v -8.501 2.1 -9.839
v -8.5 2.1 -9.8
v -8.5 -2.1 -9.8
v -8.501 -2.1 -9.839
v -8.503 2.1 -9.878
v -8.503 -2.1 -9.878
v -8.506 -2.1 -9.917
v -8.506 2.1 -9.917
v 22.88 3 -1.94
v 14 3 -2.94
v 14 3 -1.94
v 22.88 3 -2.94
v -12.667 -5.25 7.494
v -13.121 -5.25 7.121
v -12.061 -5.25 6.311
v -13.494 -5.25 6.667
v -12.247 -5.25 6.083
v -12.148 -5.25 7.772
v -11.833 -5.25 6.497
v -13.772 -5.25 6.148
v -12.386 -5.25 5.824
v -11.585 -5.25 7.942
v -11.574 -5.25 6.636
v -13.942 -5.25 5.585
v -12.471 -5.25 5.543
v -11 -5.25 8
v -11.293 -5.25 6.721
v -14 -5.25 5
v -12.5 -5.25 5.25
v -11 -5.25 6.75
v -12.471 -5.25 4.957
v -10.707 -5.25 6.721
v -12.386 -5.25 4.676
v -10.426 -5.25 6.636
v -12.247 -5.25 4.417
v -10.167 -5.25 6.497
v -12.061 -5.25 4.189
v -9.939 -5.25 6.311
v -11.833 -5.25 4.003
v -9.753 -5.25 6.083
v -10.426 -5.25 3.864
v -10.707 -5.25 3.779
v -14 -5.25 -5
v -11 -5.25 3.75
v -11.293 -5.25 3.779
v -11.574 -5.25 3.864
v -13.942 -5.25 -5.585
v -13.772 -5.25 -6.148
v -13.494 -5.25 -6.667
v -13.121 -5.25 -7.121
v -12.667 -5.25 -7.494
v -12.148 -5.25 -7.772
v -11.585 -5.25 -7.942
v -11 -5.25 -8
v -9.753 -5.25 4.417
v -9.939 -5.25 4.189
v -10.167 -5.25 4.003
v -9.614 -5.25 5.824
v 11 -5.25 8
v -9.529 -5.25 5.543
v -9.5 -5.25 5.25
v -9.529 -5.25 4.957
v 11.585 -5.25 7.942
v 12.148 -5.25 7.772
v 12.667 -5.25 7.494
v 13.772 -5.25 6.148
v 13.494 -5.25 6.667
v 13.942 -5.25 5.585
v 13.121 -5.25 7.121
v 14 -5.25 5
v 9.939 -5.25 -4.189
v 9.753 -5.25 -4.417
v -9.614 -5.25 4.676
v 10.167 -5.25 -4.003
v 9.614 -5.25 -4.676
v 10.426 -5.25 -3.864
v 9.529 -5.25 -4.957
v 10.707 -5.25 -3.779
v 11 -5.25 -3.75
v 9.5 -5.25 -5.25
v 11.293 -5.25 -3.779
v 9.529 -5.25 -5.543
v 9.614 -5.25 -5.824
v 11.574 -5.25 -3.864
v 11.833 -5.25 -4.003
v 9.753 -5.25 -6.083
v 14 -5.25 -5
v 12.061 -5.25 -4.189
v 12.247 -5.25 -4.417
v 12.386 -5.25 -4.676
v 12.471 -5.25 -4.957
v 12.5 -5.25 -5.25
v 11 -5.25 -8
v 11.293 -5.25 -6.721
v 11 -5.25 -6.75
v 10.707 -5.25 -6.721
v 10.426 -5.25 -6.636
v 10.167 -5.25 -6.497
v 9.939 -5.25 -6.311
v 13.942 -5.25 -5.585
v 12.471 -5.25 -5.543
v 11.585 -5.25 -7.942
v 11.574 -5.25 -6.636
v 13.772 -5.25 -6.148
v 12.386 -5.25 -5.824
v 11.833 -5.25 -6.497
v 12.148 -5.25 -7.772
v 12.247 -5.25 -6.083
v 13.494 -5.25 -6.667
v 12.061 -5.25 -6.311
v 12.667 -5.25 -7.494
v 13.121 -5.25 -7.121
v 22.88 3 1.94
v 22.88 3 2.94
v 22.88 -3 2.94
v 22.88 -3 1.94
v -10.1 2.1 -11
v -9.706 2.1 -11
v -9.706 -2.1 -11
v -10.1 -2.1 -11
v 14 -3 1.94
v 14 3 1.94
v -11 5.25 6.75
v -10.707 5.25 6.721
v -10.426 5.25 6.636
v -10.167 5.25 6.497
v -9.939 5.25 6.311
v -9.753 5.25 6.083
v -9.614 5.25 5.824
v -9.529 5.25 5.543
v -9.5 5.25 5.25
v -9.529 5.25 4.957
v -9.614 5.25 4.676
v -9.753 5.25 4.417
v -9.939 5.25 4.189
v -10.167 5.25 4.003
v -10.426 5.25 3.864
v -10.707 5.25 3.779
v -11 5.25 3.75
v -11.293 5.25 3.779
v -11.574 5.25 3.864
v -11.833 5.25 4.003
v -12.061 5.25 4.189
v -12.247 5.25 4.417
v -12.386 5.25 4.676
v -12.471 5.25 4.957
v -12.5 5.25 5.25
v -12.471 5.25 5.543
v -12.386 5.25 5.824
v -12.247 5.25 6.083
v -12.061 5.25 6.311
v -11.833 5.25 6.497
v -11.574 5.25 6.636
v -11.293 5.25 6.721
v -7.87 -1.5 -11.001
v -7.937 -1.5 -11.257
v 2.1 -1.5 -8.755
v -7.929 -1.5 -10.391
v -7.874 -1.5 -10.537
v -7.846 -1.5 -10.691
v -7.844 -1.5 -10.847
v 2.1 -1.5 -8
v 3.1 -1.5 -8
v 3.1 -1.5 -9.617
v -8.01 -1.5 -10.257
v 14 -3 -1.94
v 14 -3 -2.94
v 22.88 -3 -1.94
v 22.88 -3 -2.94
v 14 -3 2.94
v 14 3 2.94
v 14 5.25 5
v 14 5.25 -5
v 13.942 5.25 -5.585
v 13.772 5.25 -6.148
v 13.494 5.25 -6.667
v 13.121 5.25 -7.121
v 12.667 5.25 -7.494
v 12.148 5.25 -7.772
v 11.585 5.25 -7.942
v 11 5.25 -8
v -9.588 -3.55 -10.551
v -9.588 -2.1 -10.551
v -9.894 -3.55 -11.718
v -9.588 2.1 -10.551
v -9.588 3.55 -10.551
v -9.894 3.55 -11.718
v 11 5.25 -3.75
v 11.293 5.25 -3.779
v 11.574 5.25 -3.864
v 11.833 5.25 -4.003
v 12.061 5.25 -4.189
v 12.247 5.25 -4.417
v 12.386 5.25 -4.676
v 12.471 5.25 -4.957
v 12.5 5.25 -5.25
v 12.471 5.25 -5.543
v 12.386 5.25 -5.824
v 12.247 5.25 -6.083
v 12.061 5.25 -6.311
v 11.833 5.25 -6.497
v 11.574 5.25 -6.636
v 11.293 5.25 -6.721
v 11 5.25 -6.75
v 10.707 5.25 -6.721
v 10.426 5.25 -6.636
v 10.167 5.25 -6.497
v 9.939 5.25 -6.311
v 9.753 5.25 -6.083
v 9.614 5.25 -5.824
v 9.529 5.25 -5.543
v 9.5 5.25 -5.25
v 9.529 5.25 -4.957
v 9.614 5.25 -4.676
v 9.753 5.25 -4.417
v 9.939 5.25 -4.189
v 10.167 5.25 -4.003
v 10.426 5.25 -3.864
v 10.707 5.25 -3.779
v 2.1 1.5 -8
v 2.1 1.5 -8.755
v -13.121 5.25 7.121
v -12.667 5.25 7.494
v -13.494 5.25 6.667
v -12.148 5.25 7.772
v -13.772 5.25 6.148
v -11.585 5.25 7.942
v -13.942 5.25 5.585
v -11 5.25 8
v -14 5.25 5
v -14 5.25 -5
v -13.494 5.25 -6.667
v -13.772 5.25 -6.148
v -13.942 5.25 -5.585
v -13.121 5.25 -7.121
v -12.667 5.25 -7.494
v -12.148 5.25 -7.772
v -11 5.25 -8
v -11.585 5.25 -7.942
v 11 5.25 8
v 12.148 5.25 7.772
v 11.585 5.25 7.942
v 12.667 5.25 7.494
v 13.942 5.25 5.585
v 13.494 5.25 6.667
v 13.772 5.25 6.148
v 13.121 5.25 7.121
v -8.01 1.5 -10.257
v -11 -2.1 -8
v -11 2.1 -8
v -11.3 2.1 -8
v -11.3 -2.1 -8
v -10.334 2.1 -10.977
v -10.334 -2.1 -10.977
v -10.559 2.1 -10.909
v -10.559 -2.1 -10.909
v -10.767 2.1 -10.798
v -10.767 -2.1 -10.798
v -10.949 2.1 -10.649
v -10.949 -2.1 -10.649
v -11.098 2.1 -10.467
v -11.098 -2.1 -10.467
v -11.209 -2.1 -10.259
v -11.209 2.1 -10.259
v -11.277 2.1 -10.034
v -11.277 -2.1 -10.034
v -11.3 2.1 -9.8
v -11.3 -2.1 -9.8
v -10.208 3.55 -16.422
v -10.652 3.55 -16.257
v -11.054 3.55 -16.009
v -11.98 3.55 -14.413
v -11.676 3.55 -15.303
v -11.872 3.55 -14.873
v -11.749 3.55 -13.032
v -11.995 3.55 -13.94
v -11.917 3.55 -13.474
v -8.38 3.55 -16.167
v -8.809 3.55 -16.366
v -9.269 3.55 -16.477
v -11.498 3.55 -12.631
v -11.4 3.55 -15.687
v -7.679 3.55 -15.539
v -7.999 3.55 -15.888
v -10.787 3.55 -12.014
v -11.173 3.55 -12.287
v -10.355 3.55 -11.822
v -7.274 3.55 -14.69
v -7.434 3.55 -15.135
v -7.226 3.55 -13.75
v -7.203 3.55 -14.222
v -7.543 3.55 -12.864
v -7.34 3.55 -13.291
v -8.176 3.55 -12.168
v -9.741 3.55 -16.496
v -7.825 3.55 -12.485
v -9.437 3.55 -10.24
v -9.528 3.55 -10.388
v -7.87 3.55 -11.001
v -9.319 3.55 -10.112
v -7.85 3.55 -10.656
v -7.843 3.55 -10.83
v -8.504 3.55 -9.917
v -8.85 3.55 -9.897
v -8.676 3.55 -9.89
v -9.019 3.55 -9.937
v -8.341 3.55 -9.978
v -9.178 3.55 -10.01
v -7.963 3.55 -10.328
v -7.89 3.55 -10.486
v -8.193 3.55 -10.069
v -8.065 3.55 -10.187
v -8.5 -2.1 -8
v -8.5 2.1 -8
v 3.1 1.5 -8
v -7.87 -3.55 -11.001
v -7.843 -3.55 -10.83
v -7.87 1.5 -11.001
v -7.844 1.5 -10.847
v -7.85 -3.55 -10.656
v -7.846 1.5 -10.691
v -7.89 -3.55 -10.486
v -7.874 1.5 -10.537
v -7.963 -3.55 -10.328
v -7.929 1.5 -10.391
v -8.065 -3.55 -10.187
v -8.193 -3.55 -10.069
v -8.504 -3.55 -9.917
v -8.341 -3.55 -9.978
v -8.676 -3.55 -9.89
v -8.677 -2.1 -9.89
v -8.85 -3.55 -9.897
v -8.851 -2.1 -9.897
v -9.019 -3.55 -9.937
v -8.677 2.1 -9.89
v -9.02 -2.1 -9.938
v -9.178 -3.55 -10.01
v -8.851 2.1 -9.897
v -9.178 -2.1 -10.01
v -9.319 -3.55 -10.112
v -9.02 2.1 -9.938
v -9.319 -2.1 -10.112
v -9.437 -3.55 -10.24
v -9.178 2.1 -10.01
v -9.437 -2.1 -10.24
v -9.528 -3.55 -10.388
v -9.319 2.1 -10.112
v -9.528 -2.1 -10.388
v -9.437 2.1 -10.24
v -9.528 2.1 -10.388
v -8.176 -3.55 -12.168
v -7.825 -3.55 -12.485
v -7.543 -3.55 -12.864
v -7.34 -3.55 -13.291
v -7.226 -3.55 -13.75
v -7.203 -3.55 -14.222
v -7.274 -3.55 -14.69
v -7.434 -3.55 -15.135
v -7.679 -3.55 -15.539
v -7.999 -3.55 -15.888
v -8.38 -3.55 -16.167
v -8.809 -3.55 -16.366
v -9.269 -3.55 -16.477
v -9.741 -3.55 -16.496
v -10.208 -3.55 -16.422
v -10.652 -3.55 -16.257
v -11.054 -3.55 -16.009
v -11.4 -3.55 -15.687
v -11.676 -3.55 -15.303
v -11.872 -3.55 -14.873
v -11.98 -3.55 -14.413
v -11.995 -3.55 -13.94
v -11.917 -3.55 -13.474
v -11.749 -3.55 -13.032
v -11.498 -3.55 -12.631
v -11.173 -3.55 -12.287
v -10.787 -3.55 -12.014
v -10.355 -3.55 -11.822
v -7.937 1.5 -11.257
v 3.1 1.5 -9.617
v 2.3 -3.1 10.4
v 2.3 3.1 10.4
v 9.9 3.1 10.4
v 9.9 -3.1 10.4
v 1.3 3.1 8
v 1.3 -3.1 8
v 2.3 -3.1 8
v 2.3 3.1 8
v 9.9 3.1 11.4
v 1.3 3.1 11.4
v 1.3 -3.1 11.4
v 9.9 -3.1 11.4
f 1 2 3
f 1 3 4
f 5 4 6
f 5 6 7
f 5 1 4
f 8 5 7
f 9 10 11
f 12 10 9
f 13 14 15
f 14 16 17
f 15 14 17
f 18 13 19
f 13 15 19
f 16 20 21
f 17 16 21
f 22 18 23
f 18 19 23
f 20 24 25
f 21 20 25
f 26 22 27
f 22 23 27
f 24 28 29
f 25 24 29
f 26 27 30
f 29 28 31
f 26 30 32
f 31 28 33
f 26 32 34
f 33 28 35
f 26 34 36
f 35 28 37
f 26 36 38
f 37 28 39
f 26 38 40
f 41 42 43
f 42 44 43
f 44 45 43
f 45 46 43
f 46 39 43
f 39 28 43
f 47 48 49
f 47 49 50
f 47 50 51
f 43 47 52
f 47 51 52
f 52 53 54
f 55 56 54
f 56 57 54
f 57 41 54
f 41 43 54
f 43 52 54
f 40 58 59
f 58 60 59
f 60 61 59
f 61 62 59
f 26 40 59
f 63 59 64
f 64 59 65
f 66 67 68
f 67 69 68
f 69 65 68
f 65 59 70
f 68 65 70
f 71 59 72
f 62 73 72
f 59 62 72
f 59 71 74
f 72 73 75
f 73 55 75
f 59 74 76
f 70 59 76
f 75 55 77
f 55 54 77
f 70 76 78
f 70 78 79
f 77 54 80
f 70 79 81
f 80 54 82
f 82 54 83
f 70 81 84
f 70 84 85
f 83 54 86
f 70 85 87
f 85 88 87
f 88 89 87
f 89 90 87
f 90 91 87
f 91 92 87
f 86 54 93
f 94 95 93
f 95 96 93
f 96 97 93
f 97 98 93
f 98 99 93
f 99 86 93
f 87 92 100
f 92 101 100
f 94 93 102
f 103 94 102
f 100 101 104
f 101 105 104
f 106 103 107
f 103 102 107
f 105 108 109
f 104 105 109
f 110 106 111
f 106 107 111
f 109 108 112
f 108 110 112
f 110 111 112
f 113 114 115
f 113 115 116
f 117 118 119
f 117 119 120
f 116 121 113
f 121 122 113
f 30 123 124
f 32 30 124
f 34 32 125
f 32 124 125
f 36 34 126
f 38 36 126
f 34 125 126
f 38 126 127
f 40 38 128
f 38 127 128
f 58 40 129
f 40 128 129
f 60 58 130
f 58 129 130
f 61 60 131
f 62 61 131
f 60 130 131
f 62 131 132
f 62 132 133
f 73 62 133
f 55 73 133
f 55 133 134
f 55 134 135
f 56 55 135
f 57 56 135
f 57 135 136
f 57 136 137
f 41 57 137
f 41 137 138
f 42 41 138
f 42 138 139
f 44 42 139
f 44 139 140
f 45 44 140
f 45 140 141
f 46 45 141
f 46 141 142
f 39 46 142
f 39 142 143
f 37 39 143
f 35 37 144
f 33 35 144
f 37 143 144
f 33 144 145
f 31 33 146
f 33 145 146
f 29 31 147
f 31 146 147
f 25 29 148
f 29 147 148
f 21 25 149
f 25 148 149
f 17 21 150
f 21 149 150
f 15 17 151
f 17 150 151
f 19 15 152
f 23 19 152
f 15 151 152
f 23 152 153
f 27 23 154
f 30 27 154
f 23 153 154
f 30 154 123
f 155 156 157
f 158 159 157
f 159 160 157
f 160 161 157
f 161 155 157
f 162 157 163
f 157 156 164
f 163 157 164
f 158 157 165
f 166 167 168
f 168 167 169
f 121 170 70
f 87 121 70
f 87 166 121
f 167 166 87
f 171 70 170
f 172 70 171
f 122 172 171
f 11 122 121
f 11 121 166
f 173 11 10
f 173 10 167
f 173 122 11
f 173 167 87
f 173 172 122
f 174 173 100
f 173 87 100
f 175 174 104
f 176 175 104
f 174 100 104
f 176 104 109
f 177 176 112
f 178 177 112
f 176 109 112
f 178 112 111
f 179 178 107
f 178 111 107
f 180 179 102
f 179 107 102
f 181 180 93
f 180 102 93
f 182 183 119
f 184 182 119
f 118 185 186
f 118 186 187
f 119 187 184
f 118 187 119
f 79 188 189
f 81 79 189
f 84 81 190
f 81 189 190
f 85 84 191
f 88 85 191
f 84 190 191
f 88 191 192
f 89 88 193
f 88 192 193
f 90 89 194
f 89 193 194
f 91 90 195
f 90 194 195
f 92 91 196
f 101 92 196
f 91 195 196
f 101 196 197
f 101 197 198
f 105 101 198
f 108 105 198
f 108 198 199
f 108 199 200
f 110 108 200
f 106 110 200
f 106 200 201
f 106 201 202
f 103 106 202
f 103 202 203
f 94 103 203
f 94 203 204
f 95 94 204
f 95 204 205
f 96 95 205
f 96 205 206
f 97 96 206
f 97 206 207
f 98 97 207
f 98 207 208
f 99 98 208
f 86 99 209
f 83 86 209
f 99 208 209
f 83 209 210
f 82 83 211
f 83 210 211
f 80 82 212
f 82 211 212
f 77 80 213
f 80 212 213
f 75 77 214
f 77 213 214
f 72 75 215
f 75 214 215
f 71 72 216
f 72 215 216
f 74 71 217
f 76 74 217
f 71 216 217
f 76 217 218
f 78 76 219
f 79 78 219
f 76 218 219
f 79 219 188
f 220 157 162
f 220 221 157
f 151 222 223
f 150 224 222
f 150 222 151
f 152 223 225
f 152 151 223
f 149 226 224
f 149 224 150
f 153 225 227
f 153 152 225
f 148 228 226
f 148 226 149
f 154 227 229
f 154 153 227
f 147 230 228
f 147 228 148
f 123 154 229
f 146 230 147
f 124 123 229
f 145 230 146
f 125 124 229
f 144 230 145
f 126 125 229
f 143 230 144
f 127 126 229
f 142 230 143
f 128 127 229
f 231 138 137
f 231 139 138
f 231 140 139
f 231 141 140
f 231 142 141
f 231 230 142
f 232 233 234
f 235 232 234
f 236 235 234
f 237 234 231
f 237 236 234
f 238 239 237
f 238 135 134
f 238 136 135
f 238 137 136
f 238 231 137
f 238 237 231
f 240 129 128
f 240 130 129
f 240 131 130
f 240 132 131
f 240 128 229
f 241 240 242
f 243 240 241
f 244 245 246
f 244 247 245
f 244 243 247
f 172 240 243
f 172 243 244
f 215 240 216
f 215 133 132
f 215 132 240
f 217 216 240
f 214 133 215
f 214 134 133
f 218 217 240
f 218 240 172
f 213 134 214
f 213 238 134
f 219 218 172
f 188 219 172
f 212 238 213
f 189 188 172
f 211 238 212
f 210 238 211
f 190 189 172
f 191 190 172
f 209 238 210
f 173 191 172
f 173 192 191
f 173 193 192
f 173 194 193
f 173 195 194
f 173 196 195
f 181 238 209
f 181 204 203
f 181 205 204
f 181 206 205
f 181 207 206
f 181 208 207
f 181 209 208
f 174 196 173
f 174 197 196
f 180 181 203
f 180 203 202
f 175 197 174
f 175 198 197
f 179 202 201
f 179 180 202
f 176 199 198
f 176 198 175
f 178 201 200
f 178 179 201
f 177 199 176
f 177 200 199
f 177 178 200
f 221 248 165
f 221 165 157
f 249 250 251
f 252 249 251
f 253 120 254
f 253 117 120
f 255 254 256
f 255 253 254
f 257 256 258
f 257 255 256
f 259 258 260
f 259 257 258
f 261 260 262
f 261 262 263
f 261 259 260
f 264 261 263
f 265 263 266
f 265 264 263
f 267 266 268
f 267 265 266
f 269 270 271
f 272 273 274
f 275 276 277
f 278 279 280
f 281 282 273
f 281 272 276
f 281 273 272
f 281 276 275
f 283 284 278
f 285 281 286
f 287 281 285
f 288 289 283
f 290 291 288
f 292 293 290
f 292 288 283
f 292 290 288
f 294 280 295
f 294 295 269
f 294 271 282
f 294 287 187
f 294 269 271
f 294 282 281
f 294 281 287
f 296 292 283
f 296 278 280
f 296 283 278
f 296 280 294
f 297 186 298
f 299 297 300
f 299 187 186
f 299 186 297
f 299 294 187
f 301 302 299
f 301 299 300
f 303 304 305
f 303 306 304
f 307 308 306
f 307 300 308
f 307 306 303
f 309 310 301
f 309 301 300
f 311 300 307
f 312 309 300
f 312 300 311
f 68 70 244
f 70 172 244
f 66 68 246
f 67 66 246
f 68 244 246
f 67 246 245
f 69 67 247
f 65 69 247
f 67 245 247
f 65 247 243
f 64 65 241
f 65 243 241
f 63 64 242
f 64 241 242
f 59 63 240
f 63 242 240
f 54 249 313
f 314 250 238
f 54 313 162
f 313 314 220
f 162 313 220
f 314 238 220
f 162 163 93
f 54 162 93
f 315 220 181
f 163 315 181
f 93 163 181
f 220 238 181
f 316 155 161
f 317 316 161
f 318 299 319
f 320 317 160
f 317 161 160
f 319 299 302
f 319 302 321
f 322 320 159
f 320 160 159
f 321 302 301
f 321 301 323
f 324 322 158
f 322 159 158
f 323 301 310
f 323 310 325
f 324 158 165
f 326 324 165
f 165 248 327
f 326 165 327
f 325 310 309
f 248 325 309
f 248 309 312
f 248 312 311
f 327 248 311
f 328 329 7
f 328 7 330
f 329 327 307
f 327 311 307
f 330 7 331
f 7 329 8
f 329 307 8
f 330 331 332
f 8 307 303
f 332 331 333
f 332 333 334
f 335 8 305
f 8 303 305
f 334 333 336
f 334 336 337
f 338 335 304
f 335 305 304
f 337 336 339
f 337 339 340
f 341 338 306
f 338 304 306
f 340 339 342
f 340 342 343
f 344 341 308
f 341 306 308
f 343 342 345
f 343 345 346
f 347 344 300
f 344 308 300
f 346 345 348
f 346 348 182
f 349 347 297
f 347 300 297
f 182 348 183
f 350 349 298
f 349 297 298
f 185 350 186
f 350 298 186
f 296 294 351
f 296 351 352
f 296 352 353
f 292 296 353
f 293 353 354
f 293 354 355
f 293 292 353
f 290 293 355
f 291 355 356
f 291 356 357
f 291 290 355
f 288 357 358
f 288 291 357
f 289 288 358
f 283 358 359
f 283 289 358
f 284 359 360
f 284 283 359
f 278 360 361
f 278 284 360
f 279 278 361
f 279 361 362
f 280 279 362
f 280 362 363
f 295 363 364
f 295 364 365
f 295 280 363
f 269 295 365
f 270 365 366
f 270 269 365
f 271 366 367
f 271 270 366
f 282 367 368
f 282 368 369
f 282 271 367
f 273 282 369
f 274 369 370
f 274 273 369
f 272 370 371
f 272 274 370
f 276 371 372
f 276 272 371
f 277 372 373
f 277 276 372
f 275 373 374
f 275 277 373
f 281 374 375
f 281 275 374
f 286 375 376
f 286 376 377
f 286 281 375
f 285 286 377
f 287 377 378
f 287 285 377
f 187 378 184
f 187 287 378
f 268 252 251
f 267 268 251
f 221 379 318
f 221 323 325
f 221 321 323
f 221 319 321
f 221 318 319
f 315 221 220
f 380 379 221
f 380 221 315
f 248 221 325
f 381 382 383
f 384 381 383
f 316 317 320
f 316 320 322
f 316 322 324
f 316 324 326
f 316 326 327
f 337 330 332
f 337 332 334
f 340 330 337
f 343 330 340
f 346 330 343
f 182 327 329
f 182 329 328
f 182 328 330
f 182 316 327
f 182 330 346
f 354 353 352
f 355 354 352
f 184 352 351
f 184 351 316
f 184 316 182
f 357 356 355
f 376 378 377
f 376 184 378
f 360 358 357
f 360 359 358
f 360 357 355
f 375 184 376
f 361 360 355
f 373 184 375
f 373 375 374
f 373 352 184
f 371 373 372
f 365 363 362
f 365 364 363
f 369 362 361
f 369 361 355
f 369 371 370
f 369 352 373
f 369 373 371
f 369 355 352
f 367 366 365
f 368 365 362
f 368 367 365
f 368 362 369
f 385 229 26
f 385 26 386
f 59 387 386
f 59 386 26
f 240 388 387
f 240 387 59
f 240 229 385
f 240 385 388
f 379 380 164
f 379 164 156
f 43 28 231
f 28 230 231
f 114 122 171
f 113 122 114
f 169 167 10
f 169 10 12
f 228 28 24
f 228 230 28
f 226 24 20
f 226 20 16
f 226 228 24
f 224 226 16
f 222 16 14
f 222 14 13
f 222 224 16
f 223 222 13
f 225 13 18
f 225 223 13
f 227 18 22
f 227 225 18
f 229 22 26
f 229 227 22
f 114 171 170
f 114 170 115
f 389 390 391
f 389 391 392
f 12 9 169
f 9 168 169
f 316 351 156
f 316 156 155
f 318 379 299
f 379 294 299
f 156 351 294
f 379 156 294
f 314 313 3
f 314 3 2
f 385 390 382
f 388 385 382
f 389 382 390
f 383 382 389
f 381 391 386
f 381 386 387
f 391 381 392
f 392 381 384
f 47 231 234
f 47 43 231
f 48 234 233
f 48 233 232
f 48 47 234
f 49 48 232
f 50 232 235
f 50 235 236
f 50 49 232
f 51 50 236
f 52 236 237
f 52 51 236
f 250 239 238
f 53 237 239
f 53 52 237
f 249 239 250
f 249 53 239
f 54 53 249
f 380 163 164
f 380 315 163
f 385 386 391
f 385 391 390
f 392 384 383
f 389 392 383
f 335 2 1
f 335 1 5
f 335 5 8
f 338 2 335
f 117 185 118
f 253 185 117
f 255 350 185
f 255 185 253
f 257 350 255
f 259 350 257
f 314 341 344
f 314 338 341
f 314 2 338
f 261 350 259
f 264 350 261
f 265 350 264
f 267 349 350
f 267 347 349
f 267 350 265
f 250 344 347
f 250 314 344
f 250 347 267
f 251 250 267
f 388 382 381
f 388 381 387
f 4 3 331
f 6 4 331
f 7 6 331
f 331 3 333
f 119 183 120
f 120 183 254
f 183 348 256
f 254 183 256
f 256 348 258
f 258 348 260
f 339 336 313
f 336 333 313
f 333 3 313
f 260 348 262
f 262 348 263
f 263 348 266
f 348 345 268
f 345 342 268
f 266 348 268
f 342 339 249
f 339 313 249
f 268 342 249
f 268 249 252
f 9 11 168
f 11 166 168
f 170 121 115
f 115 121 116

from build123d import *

# Parameters (mm, degrees)
SKETCH_1_W          = 28
SKETCH_1_H          = 16
EXTRUDE_1_DEPTH     = 5.25
FILLET_1_R          = 3
CUT_EXTRUDE_1_REACH = 21.242
SKETCH_2_R          = 1.5
SKETCH_3_W          = 8.6
SKETCH_3_H          = 6.2
EXTRUDE_2_DEPTH     = 3.4
CUT_EXTRUDE_2_REACH = 21.892
SKETCH_4_W          = 7.6
SKETCH_4_H          = 2.4
SKETCH_5_W          = 8.88
SKETCH_5_H          = 1
EXTRUDE_3_DEPTH     = 3
SKETCH_6_W          = 2.8
SKETCH_6_H          = 4.2
EXTRUDE_4_DEPTH     = 3
FILLET_2_R          = 1.2
EXTRUDE_2_2_DEPTH   = 1.5
SKETCH_7_3_R        = 2.4
EXTRUDE_5_DEPTH     = 3.55
EXTRUDE_6_DEPTH     = 3.55


with BuildPart() as part:
    # 草图1 → 凸台-拉伸1 (new, symmetric)
    with BuildSketch(Plane(origin=(0, 0, 0), x_dir=(1, 0, 0), z_dir=(0, 1, 0))):
        Rectangle(SKETCH_1_W, SKETCH_1_H)
    extrude(amount=EXTRUDE_1_DEPTH, both=True)

    # 圆角1
    fillet_1_edges = [part.edges().sort_by_distance(p)[0] for p in [
        (14, 0, 8),
        (-14, 0, -8),
        (14, 0, -8),
        (-14, 0, 8),
    ]]
    fillet(fillet_1_edges, radius=FILLET_1_R)

    # 草图2 → 切除-拉伸1 (cut, up to next)
    with BuildSketch(Plane(origin=(0, 5.25, 0), x_dir=(1, 0, 0), z_dir=(0, 1, 0)), mode=Mode.PRIVATE) as cut_extrude_1_sk1:
        with Locations((11, 5.25)):
            Circle(SKETCH_2_R)
    cut_extrude_1_tool1 = extrude(cut_extrude_1_sk1.sketch, amount=-CUT_EXTRUDE_1_REACH, mode=Mode.PRIVATE) & part.part
    # 草图2 → 切除-拉伸1 (cut, up to next)
    with BuildSketch(Plane(origin=(0, 5.25, 0), x_dir=(1, 0, 0), z_dir=(0, 1, 0)), mode=Mode.PRIVATE) as cut_extrude_1_sk2:
        with Locations((-11, -5.25)):
            Circle(SKETCH_2_R)
    cut_extrude_1_tool2 = extrude(cut_extrude_1_sk2.sketch, amount=-CUT_EXTRUDE_1_REACH, mode=Mode.PRIVATE) & part.part
    add(cut_extrude_1_tool1.solids().sort_by_distance((11, 5.25, -5.25))[0], mode=Mode.SUBTRACT)
    add(cut_extrude_1_tool2.solids().sort_by_distance((-11, 5.25, 5.25))[0], mode=Mode.SUBTRACT)

    # 草图3 → Extrude 2 (add)
    with BuildSketch(Plane.XY.offset(8)):
        with Locations((5.6, 0)):
            Rectangle(SKETCH_3_W, SKETCH_3_H)
    extrude(amount=EXTRUDE_2_DEPTH)

    # 草图4 → 切除-拉伸2 (cut, up to next)
    with BuildSketch(Plane(origin=(0, 3.1, 0), x_dir=(1, 0, 0), z_dir=(0, 1, 0)), mode=Mode.PRIVATE) as cut_extrude_2_sk1:
        with Locations((6.1, -9.2)):
            Rectangle(SKETCH_4_W, SKETCH_4_H)
    cut_extrude_2_tool1 = extrude(cut_extrude_2_sk1.sketch, amount=-CUT_EXTRUDE_2_REACH, mode=Mode.PRIVATE) & part.part
    add(cut_extrude_2_tool1.solids().sort_by_distance((6.1, 3.1, 9.2))[0], mode=Mode.SUBTRACT)

    # 草图5 → 凸台-拉伸3 (add, symmetric)
    with BuildSketch(Plane(origin=(0, 0, 0), x_dir=(1, 0, 0), z_dir=(0, 1, 0))):
        with Locations((18.44, 2.44)):
            Rectangle(SKETCH_5_W, SKETCH_5_H)
        with Locations((18.44, -2.44)):
            Rectangle(SKETCH_5_W, SKETCH_5_H)
    extrude(amount=EXTRUDE_3_DEPTH, both=True)

    # 草图6 → 凸台-拉伸4 (add)
    with BuildSketch(Plane(origin=(0, 0, -8), x_dir=(-1, 0, 0), z_dir=(0, 0, -1))):
        with Locations((9.9, 0)):
            Rectangle(SKETCH_6_W, SKETCH_6_H)
    extrude(amount=EXTRUDE_4_DEPTH)

    # 圆角2
    fillet_2_edges = [part.edges().sort_by_distance(p)[0] for p in [
        (-11.3, 0, -11),
        (-8.5, 0, -11),
    ]]
    fillet(fillet_2_edges, radius=FILLET_2_R)

    # 草图7 → Extrude 2 2 (add, symmetric)
    with BuildSketch(Plane(origin=(0, 0, 0), x_dir=(1, 0, 0), z_dir=(0, 1, 0))):
        Polygon((3.1, 8), (3.1, 9.617031783), (-9.450182098, 11.481544235), (-9.597133805, 10.492400568), (2.1, 8.754620871), (2.1, 8), align=None)
    extrude(amount=EXTRUDE_2_2_DEPTH, both=True)



with BuildPart() as body_2:
    # 草图7<3> → 凸台-拉伸5 (new, symmetric)
    with BuildSketch(Plane(origin=(0, 0, 0), x_dir=(1, 0, 0), z_dir=(0, 1, 0))):
        with Locations((-9.6, 14.1)):
            Circle(SKETCH_7_3_R)
    extrude(amount=EXTRUDE_5_DEPTH, both=True)


with BuildPart() as part_1:
    add(part.part)

    add(body_2.part)  # 凸台-拉伸6 merges body 2
    # 草图8 → 凸台-拉伸6 (add, symmetric)
    with BuildSketch(Plane(origin=(0, 0, 0), x_dir=(1, 0, 0), z_dir=(0, 1, 0))):
        with BuildLine():
            Line((-8.741039597, 14.325013226), (-7.870397769, 11.001444789))
            ThreePointArc((-7.870397769, 11.001444789), (-8.504344946, 9.917471161), (-9.588318574, 10.551418337))
            Line((-9.588318574, 10.551418337), (-10.458960403, 13.874986774))
            ThreePointArc((-10.458960403, 13.874986774), (-9.825013226, 14.958960403), (-8.741039597, 14.325013226))
        make_face()
    extrude(amount=EXTRUDE_6_DEPTH, both=True)


solid = part_1.part
